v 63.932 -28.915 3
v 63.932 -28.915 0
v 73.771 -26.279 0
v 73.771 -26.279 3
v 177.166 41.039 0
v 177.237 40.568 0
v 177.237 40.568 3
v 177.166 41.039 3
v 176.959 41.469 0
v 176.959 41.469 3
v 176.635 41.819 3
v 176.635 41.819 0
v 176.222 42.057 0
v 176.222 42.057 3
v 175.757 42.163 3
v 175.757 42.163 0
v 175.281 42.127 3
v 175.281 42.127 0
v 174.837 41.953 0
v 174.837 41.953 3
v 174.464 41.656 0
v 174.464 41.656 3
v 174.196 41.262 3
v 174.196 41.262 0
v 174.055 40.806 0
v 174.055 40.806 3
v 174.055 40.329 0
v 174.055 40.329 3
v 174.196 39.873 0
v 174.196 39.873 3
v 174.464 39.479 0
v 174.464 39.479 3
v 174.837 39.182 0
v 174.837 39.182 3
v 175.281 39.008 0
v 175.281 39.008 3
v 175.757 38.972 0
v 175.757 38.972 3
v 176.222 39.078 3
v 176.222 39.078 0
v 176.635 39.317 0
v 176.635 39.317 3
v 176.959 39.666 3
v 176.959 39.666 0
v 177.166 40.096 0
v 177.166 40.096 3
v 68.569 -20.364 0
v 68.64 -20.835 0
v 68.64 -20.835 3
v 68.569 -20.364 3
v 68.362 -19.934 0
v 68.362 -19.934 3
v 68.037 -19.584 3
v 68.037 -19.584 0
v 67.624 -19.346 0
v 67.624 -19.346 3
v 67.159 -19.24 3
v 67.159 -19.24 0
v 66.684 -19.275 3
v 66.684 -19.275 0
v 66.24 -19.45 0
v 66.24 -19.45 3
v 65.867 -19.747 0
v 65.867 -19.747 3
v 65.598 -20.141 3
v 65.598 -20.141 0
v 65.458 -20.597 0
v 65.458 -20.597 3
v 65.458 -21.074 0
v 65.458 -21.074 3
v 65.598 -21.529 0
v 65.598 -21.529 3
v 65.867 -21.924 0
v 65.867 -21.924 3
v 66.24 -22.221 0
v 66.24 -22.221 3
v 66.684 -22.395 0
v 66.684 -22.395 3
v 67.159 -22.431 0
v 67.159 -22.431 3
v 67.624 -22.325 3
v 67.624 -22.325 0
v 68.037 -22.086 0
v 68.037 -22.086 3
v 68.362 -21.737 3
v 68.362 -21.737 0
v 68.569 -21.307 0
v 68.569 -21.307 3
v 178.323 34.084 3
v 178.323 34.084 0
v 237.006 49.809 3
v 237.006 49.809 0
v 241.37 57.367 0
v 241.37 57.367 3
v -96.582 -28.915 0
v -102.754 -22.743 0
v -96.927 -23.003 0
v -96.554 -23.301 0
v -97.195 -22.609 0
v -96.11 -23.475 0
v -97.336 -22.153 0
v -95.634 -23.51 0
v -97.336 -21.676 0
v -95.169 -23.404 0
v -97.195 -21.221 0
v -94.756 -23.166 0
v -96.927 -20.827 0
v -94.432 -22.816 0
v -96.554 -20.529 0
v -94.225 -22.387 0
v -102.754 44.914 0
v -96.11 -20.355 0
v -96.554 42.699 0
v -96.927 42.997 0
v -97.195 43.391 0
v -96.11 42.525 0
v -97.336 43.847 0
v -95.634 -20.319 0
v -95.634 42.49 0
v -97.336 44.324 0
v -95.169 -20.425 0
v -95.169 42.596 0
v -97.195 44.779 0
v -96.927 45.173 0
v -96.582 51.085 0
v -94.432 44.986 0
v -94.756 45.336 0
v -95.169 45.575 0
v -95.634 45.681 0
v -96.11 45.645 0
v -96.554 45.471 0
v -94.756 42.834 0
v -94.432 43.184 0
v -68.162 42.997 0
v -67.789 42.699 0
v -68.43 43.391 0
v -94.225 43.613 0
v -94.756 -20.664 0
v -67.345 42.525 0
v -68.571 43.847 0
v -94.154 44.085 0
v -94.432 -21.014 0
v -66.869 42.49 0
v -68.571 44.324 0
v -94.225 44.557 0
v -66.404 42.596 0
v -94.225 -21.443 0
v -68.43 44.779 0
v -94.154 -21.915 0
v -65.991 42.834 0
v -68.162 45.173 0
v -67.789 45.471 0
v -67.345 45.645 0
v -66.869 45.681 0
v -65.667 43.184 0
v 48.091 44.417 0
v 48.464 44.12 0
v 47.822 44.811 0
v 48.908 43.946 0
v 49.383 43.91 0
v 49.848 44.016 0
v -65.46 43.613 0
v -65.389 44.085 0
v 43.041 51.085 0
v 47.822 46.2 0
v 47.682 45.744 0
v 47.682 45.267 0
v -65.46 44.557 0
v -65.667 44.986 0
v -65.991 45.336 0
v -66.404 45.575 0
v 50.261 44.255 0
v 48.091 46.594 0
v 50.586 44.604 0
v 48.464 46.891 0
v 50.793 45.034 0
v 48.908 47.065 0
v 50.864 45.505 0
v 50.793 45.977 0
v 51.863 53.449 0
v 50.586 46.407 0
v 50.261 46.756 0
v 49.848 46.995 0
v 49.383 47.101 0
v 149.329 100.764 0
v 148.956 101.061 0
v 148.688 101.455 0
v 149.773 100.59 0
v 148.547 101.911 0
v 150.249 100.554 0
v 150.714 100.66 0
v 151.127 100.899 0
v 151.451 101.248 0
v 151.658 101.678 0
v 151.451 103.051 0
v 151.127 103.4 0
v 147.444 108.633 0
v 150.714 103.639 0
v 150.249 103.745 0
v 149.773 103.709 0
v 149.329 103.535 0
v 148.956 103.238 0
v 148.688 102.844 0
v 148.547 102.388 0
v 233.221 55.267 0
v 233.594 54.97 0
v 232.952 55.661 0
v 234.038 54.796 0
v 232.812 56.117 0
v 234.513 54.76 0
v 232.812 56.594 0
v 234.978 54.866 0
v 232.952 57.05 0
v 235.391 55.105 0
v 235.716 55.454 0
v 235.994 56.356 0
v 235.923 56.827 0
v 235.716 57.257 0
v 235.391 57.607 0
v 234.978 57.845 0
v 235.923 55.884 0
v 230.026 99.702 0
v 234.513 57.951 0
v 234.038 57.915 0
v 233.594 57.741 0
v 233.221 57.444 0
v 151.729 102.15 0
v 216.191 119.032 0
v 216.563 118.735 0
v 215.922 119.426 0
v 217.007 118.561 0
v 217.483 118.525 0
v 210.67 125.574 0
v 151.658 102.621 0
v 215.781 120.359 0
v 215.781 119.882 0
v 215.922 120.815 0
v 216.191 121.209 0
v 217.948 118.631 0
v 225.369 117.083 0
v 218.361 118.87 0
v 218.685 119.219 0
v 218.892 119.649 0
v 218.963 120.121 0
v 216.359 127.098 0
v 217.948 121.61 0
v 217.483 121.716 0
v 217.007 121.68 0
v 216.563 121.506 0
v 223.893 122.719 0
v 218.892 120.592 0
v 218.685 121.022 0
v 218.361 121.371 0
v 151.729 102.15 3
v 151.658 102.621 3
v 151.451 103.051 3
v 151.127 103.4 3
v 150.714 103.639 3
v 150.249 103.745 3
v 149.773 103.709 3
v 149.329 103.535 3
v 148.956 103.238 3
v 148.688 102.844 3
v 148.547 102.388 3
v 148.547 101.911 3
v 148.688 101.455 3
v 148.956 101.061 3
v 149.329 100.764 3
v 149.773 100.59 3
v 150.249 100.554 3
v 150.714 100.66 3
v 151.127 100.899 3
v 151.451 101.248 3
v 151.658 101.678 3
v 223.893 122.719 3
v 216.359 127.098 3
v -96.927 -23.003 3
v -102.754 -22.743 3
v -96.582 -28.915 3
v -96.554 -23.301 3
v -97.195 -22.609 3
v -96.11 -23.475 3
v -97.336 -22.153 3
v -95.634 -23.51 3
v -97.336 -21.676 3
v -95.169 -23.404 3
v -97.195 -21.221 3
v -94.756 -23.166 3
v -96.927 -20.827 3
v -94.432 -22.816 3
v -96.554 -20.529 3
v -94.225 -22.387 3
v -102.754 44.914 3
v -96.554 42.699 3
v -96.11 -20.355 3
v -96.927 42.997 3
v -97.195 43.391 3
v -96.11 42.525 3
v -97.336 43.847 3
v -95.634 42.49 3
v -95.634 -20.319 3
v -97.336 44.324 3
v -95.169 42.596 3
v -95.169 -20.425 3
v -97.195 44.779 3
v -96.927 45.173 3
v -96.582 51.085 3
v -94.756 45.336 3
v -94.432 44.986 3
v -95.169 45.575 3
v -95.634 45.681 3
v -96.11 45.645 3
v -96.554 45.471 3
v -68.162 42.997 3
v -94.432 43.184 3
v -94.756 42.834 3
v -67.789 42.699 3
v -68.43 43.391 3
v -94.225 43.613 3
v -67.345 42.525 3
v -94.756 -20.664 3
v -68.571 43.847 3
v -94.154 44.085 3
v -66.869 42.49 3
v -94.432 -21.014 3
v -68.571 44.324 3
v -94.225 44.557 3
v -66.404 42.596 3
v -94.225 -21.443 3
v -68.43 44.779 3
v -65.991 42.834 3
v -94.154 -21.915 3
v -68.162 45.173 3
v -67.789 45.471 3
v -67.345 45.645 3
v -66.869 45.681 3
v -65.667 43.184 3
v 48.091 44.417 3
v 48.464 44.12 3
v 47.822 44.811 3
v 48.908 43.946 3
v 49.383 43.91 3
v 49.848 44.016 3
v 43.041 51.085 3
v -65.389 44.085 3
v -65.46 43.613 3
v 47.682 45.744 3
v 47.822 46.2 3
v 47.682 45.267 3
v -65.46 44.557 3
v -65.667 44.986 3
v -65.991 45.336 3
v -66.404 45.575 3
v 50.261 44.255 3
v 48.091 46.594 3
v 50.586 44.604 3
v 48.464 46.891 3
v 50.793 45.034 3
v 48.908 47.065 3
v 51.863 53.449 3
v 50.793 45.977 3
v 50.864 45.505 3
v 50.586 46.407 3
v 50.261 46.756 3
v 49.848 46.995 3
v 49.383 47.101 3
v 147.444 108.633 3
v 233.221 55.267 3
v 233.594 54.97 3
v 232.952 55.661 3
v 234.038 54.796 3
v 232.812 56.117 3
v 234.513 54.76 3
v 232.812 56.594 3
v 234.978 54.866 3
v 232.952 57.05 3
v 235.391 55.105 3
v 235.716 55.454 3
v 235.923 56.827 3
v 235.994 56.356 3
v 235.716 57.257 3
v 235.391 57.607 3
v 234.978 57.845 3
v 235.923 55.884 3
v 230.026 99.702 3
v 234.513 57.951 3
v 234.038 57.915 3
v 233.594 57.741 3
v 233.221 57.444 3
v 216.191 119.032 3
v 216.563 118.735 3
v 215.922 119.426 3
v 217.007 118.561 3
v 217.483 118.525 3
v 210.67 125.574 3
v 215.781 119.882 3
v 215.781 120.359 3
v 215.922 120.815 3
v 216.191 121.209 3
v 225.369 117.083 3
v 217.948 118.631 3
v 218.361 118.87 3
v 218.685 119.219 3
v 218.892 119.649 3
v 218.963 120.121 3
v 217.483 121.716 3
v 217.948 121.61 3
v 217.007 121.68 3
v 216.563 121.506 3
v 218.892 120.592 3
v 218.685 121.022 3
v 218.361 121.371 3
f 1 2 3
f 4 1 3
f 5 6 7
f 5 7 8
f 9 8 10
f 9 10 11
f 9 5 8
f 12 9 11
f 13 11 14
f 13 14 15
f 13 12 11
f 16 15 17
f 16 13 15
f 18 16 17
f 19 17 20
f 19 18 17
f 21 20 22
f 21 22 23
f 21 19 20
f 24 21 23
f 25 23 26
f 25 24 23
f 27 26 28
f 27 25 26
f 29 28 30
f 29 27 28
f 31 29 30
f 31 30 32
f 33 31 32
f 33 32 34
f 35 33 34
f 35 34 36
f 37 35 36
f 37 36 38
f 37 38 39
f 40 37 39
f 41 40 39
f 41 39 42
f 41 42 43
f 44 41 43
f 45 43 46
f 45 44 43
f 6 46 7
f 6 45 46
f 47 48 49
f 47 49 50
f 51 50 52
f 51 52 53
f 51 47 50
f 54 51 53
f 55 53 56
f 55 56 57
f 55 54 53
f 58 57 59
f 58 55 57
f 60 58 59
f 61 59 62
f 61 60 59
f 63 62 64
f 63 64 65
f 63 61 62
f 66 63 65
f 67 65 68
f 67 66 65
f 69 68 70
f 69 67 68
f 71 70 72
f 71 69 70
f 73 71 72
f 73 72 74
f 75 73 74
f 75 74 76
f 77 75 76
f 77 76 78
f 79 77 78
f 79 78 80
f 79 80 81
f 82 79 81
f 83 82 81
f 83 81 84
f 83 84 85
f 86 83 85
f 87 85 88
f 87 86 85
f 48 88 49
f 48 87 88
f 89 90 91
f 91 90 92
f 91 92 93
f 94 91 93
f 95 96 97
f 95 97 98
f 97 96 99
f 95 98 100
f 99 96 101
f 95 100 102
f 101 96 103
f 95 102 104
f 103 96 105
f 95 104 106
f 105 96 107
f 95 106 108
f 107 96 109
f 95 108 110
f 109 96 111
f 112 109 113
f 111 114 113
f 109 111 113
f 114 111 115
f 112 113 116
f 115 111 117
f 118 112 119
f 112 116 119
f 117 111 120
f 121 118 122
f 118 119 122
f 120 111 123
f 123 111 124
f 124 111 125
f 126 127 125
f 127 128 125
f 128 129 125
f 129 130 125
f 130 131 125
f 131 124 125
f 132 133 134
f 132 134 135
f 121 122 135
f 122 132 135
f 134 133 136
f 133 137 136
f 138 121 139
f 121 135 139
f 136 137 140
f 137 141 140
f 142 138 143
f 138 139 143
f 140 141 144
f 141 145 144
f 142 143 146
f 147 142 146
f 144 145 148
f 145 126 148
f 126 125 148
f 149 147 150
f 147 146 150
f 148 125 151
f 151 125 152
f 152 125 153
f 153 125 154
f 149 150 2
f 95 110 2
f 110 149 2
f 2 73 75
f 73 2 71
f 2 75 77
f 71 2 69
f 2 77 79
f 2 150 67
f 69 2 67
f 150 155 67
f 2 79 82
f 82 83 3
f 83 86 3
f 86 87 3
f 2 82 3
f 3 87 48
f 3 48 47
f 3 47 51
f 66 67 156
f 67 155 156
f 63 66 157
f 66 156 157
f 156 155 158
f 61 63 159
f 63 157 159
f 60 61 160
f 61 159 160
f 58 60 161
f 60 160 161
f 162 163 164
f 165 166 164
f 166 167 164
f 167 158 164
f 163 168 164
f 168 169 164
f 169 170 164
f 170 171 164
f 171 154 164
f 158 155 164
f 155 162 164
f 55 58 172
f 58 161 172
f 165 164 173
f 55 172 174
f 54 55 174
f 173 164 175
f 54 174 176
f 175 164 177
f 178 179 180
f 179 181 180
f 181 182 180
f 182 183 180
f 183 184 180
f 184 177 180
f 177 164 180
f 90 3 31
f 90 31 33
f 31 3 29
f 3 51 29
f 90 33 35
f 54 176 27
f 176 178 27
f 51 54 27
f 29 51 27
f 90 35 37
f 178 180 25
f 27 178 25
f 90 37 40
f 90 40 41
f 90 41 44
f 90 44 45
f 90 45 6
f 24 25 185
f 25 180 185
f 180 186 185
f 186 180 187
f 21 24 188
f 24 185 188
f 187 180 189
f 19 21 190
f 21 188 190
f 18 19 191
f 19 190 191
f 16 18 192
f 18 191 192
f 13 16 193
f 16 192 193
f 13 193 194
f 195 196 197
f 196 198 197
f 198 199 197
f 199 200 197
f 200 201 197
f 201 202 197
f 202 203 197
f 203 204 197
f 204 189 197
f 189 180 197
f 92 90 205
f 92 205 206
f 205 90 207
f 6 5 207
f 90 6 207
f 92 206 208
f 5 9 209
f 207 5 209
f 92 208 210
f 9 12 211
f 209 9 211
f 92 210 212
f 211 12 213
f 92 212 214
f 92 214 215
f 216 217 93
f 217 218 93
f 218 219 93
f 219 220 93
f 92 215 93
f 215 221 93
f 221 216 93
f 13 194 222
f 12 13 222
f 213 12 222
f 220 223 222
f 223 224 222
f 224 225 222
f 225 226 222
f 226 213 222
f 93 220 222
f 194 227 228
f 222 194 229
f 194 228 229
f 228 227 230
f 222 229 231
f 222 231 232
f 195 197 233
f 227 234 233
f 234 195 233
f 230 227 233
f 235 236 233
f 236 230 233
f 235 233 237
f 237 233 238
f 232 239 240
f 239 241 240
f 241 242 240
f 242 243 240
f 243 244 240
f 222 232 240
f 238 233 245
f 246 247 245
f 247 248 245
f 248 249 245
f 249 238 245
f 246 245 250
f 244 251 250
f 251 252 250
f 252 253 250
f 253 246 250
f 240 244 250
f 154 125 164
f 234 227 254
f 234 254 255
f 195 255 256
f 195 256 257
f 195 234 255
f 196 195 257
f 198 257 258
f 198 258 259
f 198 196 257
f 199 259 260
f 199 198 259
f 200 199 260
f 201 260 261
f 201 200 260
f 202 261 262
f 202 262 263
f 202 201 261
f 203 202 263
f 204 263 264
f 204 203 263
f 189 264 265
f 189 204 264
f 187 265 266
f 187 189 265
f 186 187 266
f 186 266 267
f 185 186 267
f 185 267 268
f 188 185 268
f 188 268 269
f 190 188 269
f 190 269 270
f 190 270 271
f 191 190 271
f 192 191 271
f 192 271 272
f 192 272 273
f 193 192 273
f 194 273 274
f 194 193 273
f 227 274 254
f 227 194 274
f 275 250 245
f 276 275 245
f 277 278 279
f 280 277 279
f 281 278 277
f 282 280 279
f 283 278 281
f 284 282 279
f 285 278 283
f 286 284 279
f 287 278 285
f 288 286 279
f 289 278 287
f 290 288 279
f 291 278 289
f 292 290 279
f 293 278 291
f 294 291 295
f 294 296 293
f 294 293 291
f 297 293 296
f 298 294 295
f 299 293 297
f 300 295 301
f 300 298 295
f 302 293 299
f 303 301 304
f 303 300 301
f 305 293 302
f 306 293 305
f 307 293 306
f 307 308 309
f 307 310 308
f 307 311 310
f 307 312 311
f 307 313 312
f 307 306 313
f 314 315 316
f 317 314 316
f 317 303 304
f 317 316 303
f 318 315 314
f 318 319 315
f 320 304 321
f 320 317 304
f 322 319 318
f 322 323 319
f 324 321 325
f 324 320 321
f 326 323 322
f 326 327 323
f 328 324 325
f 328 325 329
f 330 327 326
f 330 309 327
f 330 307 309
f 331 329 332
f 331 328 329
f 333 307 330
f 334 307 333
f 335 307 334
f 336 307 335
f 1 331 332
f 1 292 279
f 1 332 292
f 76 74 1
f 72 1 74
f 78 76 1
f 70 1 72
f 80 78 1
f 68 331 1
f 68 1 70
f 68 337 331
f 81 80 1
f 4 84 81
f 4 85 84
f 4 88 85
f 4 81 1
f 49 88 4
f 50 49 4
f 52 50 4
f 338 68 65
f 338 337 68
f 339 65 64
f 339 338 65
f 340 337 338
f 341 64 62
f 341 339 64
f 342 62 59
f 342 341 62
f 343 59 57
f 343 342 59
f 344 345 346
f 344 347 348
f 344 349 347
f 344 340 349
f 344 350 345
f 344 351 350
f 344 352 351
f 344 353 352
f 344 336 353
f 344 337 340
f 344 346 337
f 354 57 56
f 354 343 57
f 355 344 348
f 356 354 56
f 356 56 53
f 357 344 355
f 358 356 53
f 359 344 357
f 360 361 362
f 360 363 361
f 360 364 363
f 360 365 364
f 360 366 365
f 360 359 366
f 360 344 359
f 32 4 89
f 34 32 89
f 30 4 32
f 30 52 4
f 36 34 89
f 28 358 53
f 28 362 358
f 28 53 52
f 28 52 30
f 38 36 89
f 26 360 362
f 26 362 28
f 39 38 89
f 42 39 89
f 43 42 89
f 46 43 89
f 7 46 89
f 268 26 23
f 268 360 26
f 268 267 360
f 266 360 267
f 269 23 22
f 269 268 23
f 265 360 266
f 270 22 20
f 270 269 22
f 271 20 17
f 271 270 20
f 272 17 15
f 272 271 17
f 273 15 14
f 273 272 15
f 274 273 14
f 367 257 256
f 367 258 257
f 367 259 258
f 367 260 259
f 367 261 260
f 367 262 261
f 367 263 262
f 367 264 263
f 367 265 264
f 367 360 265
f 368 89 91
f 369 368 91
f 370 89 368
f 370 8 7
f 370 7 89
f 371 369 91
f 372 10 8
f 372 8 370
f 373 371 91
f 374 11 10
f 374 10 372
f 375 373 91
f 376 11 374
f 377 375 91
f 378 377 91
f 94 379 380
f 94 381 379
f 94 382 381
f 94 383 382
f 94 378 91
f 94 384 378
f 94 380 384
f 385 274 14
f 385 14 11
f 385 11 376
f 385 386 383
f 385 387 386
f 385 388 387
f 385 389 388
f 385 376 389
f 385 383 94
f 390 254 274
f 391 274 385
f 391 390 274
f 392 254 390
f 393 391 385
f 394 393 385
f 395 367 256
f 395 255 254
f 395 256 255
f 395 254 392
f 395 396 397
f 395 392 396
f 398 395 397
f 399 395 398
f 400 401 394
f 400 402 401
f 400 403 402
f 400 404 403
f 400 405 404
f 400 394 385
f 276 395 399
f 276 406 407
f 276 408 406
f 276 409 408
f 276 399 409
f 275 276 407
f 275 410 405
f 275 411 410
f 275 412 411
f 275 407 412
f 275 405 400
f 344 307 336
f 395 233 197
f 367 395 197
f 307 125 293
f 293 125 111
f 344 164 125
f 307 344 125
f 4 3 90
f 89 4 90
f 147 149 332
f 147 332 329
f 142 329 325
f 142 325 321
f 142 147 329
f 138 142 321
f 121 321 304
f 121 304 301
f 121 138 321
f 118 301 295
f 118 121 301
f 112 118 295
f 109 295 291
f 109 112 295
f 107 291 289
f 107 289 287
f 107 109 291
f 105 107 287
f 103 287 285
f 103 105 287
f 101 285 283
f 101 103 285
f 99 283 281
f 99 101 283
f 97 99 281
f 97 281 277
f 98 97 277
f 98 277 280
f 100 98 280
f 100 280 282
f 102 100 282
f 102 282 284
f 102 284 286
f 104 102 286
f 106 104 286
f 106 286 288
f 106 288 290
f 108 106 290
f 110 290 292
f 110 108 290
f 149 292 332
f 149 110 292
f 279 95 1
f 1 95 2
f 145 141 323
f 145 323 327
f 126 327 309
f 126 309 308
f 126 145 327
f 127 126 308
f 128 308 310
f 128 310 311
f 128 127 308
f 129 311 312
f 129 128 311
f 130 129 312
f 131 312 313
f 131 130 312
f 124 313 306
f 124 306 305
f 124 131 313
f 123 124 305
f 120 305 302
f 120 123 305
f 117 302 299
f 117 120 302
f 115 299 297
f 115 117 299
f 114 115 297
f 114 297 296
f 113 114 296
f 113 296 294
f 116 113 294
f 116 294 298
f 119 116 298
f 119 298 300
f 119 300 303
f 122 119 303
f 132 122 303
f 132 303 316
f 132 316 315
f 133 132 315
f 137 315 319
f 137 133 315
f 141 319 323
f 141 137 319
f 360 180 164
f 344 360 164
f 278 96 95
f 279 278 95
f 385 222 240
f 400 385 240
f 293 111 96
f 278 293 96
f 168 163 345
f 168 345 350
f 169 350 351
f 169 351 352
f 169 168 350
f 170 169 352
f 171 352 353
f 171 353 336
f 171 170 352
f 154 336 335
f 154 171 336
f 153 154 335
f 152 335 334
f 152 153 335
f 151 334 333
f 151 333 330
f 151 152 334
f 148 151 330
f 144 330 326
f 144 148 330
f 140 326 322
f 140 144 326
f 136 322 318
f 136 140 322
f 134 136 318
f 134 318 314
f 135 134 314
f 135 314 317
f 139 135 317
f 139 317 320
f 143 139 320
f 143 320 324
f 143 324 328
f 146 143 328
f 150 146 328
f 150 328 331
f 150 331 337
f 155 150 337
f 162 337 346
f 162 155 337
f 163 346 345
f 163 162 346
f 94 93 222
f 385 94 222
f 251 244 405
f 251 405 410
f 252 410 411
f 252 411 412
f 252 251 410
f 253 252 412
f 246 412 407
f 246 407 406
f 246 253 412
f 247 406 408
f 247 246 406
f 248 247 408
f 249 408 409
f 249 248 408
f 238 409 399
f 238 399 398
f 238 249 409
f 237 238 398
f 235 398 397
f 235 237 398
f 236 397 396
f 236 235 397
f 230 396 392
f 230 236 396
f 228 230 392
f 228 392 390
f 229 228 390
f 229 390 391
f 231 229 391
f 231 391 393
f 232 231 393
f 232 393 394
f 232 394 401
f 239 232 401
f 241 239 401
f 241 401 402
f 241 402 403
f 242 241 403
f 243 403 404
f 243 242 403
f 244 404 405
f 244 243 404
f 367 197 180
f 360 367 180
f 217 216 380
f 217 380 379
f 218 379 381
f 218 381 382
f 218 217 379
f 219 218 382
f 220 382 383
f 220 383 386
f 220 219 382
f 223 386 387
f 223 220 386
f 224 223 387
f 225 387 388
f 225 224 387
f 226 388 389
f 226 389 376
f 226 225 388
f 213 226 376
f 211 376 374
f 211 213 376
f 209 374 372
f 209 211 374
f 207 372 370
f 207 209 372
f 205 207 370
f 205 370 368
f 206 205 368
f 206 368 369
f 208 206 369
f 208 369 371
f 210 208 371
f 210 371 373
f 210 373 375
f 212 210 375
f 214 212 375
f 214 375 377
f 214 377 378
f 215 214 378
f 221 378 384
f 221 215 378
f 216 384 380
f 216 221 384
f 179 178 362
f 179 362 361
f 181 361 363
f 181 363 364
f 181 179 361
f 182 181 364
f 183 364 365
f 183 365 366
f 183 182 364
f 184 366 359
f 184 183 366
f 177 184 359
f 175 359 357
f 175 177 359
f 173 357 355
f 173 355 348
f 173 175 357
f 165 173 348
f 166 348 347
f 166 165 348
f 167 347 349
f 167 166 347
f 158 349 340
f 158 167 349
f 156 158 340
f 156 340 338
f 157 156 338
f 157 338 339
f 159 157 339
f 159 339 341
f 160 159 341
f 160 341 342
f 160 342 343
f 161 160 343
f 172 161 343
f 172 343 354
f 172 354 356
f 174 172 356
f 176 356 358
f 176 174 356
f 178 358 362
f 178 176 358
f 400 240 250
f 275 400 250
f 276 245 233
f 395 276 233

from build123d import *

# Parameters (mm, degrees)
ESQUISSE1_R        = 1.6
BOSS_EXTRU_1_DEPTH = 3


with BuildPart() as part:
    # Esquisse1 → Boss.-Extru.1 (new body)
    with BuildSketch(Plane.XY):
        Polygon((-76.753762562, 51.085106383), (-96.582189687, 51.085106383), (-102.753762562, 44.913533508), (-102.753762562, 35.79522772), (-102.753762562, -22.743320742), (-96.582189687, -28.914893617), (63.932030858, -28.914893617), (73.770824067, -26.278596922), (178.322766002, 34.084494899), (237.005572372, 49.808505475), (241.369533403, 57.367107702), (230.025901746, 99.702117388), (225.368652661, 117.083207596), (223.893223799, 122.719498558), (216.359063387, 127.098384499), (210.670220477, 125.574063635), (147.443918593, 108.632627105), (51.862743071, 53.448809688), (43.041282242, 51.085106383), (-75.988646329, 51.085106383), align=None)
        with Locations((-95.753762562, 44.085106383)):
            Circle(ESQUISSE1_R, mode=Mode.SUBTRACT)
        with Locations((-66.988646329, 44.085106383)):
            Circle(ESQUISSE1_R, mode=Mode.SUBTRACT)
        with Locations((-95.753762562, -21.914893617)):
            Circle(ESQUISSE1_R, mode=Mode.SUBTRACT)
        with Locations((49.263745973, 45.505477252)):
            Circle(ESQUISSE1_R, mode=Mode.SUBTRACT)
        with Locations((67.039694146, -20.835264486)):
            Circle(ESQUISSE1_R, mode=Mode.SUBTRACT)
        with Locations((217.363403759, 120.120565138)):
            Circle(ESQUISSE1_R, mode=Mode.SUBTRACT)
        with Locations((150.12930694, 102.149526137)):
            Circle(ESQUISSE1_R, mode=Mode.SUBTRACT)
        with Locations((175.637377655, 40.567595866)):
            Circle(ESQUISSE1_R, mode=Mode.SUBTRACT)
        with Locations((234.393639901, 56.355573542)):
            Circle(ESQUISSE1_R, mode=Mode.SUBTRACT)
    extrude(amount=BOSS_EXTRU_1_DEPTH)


solid = part.part
